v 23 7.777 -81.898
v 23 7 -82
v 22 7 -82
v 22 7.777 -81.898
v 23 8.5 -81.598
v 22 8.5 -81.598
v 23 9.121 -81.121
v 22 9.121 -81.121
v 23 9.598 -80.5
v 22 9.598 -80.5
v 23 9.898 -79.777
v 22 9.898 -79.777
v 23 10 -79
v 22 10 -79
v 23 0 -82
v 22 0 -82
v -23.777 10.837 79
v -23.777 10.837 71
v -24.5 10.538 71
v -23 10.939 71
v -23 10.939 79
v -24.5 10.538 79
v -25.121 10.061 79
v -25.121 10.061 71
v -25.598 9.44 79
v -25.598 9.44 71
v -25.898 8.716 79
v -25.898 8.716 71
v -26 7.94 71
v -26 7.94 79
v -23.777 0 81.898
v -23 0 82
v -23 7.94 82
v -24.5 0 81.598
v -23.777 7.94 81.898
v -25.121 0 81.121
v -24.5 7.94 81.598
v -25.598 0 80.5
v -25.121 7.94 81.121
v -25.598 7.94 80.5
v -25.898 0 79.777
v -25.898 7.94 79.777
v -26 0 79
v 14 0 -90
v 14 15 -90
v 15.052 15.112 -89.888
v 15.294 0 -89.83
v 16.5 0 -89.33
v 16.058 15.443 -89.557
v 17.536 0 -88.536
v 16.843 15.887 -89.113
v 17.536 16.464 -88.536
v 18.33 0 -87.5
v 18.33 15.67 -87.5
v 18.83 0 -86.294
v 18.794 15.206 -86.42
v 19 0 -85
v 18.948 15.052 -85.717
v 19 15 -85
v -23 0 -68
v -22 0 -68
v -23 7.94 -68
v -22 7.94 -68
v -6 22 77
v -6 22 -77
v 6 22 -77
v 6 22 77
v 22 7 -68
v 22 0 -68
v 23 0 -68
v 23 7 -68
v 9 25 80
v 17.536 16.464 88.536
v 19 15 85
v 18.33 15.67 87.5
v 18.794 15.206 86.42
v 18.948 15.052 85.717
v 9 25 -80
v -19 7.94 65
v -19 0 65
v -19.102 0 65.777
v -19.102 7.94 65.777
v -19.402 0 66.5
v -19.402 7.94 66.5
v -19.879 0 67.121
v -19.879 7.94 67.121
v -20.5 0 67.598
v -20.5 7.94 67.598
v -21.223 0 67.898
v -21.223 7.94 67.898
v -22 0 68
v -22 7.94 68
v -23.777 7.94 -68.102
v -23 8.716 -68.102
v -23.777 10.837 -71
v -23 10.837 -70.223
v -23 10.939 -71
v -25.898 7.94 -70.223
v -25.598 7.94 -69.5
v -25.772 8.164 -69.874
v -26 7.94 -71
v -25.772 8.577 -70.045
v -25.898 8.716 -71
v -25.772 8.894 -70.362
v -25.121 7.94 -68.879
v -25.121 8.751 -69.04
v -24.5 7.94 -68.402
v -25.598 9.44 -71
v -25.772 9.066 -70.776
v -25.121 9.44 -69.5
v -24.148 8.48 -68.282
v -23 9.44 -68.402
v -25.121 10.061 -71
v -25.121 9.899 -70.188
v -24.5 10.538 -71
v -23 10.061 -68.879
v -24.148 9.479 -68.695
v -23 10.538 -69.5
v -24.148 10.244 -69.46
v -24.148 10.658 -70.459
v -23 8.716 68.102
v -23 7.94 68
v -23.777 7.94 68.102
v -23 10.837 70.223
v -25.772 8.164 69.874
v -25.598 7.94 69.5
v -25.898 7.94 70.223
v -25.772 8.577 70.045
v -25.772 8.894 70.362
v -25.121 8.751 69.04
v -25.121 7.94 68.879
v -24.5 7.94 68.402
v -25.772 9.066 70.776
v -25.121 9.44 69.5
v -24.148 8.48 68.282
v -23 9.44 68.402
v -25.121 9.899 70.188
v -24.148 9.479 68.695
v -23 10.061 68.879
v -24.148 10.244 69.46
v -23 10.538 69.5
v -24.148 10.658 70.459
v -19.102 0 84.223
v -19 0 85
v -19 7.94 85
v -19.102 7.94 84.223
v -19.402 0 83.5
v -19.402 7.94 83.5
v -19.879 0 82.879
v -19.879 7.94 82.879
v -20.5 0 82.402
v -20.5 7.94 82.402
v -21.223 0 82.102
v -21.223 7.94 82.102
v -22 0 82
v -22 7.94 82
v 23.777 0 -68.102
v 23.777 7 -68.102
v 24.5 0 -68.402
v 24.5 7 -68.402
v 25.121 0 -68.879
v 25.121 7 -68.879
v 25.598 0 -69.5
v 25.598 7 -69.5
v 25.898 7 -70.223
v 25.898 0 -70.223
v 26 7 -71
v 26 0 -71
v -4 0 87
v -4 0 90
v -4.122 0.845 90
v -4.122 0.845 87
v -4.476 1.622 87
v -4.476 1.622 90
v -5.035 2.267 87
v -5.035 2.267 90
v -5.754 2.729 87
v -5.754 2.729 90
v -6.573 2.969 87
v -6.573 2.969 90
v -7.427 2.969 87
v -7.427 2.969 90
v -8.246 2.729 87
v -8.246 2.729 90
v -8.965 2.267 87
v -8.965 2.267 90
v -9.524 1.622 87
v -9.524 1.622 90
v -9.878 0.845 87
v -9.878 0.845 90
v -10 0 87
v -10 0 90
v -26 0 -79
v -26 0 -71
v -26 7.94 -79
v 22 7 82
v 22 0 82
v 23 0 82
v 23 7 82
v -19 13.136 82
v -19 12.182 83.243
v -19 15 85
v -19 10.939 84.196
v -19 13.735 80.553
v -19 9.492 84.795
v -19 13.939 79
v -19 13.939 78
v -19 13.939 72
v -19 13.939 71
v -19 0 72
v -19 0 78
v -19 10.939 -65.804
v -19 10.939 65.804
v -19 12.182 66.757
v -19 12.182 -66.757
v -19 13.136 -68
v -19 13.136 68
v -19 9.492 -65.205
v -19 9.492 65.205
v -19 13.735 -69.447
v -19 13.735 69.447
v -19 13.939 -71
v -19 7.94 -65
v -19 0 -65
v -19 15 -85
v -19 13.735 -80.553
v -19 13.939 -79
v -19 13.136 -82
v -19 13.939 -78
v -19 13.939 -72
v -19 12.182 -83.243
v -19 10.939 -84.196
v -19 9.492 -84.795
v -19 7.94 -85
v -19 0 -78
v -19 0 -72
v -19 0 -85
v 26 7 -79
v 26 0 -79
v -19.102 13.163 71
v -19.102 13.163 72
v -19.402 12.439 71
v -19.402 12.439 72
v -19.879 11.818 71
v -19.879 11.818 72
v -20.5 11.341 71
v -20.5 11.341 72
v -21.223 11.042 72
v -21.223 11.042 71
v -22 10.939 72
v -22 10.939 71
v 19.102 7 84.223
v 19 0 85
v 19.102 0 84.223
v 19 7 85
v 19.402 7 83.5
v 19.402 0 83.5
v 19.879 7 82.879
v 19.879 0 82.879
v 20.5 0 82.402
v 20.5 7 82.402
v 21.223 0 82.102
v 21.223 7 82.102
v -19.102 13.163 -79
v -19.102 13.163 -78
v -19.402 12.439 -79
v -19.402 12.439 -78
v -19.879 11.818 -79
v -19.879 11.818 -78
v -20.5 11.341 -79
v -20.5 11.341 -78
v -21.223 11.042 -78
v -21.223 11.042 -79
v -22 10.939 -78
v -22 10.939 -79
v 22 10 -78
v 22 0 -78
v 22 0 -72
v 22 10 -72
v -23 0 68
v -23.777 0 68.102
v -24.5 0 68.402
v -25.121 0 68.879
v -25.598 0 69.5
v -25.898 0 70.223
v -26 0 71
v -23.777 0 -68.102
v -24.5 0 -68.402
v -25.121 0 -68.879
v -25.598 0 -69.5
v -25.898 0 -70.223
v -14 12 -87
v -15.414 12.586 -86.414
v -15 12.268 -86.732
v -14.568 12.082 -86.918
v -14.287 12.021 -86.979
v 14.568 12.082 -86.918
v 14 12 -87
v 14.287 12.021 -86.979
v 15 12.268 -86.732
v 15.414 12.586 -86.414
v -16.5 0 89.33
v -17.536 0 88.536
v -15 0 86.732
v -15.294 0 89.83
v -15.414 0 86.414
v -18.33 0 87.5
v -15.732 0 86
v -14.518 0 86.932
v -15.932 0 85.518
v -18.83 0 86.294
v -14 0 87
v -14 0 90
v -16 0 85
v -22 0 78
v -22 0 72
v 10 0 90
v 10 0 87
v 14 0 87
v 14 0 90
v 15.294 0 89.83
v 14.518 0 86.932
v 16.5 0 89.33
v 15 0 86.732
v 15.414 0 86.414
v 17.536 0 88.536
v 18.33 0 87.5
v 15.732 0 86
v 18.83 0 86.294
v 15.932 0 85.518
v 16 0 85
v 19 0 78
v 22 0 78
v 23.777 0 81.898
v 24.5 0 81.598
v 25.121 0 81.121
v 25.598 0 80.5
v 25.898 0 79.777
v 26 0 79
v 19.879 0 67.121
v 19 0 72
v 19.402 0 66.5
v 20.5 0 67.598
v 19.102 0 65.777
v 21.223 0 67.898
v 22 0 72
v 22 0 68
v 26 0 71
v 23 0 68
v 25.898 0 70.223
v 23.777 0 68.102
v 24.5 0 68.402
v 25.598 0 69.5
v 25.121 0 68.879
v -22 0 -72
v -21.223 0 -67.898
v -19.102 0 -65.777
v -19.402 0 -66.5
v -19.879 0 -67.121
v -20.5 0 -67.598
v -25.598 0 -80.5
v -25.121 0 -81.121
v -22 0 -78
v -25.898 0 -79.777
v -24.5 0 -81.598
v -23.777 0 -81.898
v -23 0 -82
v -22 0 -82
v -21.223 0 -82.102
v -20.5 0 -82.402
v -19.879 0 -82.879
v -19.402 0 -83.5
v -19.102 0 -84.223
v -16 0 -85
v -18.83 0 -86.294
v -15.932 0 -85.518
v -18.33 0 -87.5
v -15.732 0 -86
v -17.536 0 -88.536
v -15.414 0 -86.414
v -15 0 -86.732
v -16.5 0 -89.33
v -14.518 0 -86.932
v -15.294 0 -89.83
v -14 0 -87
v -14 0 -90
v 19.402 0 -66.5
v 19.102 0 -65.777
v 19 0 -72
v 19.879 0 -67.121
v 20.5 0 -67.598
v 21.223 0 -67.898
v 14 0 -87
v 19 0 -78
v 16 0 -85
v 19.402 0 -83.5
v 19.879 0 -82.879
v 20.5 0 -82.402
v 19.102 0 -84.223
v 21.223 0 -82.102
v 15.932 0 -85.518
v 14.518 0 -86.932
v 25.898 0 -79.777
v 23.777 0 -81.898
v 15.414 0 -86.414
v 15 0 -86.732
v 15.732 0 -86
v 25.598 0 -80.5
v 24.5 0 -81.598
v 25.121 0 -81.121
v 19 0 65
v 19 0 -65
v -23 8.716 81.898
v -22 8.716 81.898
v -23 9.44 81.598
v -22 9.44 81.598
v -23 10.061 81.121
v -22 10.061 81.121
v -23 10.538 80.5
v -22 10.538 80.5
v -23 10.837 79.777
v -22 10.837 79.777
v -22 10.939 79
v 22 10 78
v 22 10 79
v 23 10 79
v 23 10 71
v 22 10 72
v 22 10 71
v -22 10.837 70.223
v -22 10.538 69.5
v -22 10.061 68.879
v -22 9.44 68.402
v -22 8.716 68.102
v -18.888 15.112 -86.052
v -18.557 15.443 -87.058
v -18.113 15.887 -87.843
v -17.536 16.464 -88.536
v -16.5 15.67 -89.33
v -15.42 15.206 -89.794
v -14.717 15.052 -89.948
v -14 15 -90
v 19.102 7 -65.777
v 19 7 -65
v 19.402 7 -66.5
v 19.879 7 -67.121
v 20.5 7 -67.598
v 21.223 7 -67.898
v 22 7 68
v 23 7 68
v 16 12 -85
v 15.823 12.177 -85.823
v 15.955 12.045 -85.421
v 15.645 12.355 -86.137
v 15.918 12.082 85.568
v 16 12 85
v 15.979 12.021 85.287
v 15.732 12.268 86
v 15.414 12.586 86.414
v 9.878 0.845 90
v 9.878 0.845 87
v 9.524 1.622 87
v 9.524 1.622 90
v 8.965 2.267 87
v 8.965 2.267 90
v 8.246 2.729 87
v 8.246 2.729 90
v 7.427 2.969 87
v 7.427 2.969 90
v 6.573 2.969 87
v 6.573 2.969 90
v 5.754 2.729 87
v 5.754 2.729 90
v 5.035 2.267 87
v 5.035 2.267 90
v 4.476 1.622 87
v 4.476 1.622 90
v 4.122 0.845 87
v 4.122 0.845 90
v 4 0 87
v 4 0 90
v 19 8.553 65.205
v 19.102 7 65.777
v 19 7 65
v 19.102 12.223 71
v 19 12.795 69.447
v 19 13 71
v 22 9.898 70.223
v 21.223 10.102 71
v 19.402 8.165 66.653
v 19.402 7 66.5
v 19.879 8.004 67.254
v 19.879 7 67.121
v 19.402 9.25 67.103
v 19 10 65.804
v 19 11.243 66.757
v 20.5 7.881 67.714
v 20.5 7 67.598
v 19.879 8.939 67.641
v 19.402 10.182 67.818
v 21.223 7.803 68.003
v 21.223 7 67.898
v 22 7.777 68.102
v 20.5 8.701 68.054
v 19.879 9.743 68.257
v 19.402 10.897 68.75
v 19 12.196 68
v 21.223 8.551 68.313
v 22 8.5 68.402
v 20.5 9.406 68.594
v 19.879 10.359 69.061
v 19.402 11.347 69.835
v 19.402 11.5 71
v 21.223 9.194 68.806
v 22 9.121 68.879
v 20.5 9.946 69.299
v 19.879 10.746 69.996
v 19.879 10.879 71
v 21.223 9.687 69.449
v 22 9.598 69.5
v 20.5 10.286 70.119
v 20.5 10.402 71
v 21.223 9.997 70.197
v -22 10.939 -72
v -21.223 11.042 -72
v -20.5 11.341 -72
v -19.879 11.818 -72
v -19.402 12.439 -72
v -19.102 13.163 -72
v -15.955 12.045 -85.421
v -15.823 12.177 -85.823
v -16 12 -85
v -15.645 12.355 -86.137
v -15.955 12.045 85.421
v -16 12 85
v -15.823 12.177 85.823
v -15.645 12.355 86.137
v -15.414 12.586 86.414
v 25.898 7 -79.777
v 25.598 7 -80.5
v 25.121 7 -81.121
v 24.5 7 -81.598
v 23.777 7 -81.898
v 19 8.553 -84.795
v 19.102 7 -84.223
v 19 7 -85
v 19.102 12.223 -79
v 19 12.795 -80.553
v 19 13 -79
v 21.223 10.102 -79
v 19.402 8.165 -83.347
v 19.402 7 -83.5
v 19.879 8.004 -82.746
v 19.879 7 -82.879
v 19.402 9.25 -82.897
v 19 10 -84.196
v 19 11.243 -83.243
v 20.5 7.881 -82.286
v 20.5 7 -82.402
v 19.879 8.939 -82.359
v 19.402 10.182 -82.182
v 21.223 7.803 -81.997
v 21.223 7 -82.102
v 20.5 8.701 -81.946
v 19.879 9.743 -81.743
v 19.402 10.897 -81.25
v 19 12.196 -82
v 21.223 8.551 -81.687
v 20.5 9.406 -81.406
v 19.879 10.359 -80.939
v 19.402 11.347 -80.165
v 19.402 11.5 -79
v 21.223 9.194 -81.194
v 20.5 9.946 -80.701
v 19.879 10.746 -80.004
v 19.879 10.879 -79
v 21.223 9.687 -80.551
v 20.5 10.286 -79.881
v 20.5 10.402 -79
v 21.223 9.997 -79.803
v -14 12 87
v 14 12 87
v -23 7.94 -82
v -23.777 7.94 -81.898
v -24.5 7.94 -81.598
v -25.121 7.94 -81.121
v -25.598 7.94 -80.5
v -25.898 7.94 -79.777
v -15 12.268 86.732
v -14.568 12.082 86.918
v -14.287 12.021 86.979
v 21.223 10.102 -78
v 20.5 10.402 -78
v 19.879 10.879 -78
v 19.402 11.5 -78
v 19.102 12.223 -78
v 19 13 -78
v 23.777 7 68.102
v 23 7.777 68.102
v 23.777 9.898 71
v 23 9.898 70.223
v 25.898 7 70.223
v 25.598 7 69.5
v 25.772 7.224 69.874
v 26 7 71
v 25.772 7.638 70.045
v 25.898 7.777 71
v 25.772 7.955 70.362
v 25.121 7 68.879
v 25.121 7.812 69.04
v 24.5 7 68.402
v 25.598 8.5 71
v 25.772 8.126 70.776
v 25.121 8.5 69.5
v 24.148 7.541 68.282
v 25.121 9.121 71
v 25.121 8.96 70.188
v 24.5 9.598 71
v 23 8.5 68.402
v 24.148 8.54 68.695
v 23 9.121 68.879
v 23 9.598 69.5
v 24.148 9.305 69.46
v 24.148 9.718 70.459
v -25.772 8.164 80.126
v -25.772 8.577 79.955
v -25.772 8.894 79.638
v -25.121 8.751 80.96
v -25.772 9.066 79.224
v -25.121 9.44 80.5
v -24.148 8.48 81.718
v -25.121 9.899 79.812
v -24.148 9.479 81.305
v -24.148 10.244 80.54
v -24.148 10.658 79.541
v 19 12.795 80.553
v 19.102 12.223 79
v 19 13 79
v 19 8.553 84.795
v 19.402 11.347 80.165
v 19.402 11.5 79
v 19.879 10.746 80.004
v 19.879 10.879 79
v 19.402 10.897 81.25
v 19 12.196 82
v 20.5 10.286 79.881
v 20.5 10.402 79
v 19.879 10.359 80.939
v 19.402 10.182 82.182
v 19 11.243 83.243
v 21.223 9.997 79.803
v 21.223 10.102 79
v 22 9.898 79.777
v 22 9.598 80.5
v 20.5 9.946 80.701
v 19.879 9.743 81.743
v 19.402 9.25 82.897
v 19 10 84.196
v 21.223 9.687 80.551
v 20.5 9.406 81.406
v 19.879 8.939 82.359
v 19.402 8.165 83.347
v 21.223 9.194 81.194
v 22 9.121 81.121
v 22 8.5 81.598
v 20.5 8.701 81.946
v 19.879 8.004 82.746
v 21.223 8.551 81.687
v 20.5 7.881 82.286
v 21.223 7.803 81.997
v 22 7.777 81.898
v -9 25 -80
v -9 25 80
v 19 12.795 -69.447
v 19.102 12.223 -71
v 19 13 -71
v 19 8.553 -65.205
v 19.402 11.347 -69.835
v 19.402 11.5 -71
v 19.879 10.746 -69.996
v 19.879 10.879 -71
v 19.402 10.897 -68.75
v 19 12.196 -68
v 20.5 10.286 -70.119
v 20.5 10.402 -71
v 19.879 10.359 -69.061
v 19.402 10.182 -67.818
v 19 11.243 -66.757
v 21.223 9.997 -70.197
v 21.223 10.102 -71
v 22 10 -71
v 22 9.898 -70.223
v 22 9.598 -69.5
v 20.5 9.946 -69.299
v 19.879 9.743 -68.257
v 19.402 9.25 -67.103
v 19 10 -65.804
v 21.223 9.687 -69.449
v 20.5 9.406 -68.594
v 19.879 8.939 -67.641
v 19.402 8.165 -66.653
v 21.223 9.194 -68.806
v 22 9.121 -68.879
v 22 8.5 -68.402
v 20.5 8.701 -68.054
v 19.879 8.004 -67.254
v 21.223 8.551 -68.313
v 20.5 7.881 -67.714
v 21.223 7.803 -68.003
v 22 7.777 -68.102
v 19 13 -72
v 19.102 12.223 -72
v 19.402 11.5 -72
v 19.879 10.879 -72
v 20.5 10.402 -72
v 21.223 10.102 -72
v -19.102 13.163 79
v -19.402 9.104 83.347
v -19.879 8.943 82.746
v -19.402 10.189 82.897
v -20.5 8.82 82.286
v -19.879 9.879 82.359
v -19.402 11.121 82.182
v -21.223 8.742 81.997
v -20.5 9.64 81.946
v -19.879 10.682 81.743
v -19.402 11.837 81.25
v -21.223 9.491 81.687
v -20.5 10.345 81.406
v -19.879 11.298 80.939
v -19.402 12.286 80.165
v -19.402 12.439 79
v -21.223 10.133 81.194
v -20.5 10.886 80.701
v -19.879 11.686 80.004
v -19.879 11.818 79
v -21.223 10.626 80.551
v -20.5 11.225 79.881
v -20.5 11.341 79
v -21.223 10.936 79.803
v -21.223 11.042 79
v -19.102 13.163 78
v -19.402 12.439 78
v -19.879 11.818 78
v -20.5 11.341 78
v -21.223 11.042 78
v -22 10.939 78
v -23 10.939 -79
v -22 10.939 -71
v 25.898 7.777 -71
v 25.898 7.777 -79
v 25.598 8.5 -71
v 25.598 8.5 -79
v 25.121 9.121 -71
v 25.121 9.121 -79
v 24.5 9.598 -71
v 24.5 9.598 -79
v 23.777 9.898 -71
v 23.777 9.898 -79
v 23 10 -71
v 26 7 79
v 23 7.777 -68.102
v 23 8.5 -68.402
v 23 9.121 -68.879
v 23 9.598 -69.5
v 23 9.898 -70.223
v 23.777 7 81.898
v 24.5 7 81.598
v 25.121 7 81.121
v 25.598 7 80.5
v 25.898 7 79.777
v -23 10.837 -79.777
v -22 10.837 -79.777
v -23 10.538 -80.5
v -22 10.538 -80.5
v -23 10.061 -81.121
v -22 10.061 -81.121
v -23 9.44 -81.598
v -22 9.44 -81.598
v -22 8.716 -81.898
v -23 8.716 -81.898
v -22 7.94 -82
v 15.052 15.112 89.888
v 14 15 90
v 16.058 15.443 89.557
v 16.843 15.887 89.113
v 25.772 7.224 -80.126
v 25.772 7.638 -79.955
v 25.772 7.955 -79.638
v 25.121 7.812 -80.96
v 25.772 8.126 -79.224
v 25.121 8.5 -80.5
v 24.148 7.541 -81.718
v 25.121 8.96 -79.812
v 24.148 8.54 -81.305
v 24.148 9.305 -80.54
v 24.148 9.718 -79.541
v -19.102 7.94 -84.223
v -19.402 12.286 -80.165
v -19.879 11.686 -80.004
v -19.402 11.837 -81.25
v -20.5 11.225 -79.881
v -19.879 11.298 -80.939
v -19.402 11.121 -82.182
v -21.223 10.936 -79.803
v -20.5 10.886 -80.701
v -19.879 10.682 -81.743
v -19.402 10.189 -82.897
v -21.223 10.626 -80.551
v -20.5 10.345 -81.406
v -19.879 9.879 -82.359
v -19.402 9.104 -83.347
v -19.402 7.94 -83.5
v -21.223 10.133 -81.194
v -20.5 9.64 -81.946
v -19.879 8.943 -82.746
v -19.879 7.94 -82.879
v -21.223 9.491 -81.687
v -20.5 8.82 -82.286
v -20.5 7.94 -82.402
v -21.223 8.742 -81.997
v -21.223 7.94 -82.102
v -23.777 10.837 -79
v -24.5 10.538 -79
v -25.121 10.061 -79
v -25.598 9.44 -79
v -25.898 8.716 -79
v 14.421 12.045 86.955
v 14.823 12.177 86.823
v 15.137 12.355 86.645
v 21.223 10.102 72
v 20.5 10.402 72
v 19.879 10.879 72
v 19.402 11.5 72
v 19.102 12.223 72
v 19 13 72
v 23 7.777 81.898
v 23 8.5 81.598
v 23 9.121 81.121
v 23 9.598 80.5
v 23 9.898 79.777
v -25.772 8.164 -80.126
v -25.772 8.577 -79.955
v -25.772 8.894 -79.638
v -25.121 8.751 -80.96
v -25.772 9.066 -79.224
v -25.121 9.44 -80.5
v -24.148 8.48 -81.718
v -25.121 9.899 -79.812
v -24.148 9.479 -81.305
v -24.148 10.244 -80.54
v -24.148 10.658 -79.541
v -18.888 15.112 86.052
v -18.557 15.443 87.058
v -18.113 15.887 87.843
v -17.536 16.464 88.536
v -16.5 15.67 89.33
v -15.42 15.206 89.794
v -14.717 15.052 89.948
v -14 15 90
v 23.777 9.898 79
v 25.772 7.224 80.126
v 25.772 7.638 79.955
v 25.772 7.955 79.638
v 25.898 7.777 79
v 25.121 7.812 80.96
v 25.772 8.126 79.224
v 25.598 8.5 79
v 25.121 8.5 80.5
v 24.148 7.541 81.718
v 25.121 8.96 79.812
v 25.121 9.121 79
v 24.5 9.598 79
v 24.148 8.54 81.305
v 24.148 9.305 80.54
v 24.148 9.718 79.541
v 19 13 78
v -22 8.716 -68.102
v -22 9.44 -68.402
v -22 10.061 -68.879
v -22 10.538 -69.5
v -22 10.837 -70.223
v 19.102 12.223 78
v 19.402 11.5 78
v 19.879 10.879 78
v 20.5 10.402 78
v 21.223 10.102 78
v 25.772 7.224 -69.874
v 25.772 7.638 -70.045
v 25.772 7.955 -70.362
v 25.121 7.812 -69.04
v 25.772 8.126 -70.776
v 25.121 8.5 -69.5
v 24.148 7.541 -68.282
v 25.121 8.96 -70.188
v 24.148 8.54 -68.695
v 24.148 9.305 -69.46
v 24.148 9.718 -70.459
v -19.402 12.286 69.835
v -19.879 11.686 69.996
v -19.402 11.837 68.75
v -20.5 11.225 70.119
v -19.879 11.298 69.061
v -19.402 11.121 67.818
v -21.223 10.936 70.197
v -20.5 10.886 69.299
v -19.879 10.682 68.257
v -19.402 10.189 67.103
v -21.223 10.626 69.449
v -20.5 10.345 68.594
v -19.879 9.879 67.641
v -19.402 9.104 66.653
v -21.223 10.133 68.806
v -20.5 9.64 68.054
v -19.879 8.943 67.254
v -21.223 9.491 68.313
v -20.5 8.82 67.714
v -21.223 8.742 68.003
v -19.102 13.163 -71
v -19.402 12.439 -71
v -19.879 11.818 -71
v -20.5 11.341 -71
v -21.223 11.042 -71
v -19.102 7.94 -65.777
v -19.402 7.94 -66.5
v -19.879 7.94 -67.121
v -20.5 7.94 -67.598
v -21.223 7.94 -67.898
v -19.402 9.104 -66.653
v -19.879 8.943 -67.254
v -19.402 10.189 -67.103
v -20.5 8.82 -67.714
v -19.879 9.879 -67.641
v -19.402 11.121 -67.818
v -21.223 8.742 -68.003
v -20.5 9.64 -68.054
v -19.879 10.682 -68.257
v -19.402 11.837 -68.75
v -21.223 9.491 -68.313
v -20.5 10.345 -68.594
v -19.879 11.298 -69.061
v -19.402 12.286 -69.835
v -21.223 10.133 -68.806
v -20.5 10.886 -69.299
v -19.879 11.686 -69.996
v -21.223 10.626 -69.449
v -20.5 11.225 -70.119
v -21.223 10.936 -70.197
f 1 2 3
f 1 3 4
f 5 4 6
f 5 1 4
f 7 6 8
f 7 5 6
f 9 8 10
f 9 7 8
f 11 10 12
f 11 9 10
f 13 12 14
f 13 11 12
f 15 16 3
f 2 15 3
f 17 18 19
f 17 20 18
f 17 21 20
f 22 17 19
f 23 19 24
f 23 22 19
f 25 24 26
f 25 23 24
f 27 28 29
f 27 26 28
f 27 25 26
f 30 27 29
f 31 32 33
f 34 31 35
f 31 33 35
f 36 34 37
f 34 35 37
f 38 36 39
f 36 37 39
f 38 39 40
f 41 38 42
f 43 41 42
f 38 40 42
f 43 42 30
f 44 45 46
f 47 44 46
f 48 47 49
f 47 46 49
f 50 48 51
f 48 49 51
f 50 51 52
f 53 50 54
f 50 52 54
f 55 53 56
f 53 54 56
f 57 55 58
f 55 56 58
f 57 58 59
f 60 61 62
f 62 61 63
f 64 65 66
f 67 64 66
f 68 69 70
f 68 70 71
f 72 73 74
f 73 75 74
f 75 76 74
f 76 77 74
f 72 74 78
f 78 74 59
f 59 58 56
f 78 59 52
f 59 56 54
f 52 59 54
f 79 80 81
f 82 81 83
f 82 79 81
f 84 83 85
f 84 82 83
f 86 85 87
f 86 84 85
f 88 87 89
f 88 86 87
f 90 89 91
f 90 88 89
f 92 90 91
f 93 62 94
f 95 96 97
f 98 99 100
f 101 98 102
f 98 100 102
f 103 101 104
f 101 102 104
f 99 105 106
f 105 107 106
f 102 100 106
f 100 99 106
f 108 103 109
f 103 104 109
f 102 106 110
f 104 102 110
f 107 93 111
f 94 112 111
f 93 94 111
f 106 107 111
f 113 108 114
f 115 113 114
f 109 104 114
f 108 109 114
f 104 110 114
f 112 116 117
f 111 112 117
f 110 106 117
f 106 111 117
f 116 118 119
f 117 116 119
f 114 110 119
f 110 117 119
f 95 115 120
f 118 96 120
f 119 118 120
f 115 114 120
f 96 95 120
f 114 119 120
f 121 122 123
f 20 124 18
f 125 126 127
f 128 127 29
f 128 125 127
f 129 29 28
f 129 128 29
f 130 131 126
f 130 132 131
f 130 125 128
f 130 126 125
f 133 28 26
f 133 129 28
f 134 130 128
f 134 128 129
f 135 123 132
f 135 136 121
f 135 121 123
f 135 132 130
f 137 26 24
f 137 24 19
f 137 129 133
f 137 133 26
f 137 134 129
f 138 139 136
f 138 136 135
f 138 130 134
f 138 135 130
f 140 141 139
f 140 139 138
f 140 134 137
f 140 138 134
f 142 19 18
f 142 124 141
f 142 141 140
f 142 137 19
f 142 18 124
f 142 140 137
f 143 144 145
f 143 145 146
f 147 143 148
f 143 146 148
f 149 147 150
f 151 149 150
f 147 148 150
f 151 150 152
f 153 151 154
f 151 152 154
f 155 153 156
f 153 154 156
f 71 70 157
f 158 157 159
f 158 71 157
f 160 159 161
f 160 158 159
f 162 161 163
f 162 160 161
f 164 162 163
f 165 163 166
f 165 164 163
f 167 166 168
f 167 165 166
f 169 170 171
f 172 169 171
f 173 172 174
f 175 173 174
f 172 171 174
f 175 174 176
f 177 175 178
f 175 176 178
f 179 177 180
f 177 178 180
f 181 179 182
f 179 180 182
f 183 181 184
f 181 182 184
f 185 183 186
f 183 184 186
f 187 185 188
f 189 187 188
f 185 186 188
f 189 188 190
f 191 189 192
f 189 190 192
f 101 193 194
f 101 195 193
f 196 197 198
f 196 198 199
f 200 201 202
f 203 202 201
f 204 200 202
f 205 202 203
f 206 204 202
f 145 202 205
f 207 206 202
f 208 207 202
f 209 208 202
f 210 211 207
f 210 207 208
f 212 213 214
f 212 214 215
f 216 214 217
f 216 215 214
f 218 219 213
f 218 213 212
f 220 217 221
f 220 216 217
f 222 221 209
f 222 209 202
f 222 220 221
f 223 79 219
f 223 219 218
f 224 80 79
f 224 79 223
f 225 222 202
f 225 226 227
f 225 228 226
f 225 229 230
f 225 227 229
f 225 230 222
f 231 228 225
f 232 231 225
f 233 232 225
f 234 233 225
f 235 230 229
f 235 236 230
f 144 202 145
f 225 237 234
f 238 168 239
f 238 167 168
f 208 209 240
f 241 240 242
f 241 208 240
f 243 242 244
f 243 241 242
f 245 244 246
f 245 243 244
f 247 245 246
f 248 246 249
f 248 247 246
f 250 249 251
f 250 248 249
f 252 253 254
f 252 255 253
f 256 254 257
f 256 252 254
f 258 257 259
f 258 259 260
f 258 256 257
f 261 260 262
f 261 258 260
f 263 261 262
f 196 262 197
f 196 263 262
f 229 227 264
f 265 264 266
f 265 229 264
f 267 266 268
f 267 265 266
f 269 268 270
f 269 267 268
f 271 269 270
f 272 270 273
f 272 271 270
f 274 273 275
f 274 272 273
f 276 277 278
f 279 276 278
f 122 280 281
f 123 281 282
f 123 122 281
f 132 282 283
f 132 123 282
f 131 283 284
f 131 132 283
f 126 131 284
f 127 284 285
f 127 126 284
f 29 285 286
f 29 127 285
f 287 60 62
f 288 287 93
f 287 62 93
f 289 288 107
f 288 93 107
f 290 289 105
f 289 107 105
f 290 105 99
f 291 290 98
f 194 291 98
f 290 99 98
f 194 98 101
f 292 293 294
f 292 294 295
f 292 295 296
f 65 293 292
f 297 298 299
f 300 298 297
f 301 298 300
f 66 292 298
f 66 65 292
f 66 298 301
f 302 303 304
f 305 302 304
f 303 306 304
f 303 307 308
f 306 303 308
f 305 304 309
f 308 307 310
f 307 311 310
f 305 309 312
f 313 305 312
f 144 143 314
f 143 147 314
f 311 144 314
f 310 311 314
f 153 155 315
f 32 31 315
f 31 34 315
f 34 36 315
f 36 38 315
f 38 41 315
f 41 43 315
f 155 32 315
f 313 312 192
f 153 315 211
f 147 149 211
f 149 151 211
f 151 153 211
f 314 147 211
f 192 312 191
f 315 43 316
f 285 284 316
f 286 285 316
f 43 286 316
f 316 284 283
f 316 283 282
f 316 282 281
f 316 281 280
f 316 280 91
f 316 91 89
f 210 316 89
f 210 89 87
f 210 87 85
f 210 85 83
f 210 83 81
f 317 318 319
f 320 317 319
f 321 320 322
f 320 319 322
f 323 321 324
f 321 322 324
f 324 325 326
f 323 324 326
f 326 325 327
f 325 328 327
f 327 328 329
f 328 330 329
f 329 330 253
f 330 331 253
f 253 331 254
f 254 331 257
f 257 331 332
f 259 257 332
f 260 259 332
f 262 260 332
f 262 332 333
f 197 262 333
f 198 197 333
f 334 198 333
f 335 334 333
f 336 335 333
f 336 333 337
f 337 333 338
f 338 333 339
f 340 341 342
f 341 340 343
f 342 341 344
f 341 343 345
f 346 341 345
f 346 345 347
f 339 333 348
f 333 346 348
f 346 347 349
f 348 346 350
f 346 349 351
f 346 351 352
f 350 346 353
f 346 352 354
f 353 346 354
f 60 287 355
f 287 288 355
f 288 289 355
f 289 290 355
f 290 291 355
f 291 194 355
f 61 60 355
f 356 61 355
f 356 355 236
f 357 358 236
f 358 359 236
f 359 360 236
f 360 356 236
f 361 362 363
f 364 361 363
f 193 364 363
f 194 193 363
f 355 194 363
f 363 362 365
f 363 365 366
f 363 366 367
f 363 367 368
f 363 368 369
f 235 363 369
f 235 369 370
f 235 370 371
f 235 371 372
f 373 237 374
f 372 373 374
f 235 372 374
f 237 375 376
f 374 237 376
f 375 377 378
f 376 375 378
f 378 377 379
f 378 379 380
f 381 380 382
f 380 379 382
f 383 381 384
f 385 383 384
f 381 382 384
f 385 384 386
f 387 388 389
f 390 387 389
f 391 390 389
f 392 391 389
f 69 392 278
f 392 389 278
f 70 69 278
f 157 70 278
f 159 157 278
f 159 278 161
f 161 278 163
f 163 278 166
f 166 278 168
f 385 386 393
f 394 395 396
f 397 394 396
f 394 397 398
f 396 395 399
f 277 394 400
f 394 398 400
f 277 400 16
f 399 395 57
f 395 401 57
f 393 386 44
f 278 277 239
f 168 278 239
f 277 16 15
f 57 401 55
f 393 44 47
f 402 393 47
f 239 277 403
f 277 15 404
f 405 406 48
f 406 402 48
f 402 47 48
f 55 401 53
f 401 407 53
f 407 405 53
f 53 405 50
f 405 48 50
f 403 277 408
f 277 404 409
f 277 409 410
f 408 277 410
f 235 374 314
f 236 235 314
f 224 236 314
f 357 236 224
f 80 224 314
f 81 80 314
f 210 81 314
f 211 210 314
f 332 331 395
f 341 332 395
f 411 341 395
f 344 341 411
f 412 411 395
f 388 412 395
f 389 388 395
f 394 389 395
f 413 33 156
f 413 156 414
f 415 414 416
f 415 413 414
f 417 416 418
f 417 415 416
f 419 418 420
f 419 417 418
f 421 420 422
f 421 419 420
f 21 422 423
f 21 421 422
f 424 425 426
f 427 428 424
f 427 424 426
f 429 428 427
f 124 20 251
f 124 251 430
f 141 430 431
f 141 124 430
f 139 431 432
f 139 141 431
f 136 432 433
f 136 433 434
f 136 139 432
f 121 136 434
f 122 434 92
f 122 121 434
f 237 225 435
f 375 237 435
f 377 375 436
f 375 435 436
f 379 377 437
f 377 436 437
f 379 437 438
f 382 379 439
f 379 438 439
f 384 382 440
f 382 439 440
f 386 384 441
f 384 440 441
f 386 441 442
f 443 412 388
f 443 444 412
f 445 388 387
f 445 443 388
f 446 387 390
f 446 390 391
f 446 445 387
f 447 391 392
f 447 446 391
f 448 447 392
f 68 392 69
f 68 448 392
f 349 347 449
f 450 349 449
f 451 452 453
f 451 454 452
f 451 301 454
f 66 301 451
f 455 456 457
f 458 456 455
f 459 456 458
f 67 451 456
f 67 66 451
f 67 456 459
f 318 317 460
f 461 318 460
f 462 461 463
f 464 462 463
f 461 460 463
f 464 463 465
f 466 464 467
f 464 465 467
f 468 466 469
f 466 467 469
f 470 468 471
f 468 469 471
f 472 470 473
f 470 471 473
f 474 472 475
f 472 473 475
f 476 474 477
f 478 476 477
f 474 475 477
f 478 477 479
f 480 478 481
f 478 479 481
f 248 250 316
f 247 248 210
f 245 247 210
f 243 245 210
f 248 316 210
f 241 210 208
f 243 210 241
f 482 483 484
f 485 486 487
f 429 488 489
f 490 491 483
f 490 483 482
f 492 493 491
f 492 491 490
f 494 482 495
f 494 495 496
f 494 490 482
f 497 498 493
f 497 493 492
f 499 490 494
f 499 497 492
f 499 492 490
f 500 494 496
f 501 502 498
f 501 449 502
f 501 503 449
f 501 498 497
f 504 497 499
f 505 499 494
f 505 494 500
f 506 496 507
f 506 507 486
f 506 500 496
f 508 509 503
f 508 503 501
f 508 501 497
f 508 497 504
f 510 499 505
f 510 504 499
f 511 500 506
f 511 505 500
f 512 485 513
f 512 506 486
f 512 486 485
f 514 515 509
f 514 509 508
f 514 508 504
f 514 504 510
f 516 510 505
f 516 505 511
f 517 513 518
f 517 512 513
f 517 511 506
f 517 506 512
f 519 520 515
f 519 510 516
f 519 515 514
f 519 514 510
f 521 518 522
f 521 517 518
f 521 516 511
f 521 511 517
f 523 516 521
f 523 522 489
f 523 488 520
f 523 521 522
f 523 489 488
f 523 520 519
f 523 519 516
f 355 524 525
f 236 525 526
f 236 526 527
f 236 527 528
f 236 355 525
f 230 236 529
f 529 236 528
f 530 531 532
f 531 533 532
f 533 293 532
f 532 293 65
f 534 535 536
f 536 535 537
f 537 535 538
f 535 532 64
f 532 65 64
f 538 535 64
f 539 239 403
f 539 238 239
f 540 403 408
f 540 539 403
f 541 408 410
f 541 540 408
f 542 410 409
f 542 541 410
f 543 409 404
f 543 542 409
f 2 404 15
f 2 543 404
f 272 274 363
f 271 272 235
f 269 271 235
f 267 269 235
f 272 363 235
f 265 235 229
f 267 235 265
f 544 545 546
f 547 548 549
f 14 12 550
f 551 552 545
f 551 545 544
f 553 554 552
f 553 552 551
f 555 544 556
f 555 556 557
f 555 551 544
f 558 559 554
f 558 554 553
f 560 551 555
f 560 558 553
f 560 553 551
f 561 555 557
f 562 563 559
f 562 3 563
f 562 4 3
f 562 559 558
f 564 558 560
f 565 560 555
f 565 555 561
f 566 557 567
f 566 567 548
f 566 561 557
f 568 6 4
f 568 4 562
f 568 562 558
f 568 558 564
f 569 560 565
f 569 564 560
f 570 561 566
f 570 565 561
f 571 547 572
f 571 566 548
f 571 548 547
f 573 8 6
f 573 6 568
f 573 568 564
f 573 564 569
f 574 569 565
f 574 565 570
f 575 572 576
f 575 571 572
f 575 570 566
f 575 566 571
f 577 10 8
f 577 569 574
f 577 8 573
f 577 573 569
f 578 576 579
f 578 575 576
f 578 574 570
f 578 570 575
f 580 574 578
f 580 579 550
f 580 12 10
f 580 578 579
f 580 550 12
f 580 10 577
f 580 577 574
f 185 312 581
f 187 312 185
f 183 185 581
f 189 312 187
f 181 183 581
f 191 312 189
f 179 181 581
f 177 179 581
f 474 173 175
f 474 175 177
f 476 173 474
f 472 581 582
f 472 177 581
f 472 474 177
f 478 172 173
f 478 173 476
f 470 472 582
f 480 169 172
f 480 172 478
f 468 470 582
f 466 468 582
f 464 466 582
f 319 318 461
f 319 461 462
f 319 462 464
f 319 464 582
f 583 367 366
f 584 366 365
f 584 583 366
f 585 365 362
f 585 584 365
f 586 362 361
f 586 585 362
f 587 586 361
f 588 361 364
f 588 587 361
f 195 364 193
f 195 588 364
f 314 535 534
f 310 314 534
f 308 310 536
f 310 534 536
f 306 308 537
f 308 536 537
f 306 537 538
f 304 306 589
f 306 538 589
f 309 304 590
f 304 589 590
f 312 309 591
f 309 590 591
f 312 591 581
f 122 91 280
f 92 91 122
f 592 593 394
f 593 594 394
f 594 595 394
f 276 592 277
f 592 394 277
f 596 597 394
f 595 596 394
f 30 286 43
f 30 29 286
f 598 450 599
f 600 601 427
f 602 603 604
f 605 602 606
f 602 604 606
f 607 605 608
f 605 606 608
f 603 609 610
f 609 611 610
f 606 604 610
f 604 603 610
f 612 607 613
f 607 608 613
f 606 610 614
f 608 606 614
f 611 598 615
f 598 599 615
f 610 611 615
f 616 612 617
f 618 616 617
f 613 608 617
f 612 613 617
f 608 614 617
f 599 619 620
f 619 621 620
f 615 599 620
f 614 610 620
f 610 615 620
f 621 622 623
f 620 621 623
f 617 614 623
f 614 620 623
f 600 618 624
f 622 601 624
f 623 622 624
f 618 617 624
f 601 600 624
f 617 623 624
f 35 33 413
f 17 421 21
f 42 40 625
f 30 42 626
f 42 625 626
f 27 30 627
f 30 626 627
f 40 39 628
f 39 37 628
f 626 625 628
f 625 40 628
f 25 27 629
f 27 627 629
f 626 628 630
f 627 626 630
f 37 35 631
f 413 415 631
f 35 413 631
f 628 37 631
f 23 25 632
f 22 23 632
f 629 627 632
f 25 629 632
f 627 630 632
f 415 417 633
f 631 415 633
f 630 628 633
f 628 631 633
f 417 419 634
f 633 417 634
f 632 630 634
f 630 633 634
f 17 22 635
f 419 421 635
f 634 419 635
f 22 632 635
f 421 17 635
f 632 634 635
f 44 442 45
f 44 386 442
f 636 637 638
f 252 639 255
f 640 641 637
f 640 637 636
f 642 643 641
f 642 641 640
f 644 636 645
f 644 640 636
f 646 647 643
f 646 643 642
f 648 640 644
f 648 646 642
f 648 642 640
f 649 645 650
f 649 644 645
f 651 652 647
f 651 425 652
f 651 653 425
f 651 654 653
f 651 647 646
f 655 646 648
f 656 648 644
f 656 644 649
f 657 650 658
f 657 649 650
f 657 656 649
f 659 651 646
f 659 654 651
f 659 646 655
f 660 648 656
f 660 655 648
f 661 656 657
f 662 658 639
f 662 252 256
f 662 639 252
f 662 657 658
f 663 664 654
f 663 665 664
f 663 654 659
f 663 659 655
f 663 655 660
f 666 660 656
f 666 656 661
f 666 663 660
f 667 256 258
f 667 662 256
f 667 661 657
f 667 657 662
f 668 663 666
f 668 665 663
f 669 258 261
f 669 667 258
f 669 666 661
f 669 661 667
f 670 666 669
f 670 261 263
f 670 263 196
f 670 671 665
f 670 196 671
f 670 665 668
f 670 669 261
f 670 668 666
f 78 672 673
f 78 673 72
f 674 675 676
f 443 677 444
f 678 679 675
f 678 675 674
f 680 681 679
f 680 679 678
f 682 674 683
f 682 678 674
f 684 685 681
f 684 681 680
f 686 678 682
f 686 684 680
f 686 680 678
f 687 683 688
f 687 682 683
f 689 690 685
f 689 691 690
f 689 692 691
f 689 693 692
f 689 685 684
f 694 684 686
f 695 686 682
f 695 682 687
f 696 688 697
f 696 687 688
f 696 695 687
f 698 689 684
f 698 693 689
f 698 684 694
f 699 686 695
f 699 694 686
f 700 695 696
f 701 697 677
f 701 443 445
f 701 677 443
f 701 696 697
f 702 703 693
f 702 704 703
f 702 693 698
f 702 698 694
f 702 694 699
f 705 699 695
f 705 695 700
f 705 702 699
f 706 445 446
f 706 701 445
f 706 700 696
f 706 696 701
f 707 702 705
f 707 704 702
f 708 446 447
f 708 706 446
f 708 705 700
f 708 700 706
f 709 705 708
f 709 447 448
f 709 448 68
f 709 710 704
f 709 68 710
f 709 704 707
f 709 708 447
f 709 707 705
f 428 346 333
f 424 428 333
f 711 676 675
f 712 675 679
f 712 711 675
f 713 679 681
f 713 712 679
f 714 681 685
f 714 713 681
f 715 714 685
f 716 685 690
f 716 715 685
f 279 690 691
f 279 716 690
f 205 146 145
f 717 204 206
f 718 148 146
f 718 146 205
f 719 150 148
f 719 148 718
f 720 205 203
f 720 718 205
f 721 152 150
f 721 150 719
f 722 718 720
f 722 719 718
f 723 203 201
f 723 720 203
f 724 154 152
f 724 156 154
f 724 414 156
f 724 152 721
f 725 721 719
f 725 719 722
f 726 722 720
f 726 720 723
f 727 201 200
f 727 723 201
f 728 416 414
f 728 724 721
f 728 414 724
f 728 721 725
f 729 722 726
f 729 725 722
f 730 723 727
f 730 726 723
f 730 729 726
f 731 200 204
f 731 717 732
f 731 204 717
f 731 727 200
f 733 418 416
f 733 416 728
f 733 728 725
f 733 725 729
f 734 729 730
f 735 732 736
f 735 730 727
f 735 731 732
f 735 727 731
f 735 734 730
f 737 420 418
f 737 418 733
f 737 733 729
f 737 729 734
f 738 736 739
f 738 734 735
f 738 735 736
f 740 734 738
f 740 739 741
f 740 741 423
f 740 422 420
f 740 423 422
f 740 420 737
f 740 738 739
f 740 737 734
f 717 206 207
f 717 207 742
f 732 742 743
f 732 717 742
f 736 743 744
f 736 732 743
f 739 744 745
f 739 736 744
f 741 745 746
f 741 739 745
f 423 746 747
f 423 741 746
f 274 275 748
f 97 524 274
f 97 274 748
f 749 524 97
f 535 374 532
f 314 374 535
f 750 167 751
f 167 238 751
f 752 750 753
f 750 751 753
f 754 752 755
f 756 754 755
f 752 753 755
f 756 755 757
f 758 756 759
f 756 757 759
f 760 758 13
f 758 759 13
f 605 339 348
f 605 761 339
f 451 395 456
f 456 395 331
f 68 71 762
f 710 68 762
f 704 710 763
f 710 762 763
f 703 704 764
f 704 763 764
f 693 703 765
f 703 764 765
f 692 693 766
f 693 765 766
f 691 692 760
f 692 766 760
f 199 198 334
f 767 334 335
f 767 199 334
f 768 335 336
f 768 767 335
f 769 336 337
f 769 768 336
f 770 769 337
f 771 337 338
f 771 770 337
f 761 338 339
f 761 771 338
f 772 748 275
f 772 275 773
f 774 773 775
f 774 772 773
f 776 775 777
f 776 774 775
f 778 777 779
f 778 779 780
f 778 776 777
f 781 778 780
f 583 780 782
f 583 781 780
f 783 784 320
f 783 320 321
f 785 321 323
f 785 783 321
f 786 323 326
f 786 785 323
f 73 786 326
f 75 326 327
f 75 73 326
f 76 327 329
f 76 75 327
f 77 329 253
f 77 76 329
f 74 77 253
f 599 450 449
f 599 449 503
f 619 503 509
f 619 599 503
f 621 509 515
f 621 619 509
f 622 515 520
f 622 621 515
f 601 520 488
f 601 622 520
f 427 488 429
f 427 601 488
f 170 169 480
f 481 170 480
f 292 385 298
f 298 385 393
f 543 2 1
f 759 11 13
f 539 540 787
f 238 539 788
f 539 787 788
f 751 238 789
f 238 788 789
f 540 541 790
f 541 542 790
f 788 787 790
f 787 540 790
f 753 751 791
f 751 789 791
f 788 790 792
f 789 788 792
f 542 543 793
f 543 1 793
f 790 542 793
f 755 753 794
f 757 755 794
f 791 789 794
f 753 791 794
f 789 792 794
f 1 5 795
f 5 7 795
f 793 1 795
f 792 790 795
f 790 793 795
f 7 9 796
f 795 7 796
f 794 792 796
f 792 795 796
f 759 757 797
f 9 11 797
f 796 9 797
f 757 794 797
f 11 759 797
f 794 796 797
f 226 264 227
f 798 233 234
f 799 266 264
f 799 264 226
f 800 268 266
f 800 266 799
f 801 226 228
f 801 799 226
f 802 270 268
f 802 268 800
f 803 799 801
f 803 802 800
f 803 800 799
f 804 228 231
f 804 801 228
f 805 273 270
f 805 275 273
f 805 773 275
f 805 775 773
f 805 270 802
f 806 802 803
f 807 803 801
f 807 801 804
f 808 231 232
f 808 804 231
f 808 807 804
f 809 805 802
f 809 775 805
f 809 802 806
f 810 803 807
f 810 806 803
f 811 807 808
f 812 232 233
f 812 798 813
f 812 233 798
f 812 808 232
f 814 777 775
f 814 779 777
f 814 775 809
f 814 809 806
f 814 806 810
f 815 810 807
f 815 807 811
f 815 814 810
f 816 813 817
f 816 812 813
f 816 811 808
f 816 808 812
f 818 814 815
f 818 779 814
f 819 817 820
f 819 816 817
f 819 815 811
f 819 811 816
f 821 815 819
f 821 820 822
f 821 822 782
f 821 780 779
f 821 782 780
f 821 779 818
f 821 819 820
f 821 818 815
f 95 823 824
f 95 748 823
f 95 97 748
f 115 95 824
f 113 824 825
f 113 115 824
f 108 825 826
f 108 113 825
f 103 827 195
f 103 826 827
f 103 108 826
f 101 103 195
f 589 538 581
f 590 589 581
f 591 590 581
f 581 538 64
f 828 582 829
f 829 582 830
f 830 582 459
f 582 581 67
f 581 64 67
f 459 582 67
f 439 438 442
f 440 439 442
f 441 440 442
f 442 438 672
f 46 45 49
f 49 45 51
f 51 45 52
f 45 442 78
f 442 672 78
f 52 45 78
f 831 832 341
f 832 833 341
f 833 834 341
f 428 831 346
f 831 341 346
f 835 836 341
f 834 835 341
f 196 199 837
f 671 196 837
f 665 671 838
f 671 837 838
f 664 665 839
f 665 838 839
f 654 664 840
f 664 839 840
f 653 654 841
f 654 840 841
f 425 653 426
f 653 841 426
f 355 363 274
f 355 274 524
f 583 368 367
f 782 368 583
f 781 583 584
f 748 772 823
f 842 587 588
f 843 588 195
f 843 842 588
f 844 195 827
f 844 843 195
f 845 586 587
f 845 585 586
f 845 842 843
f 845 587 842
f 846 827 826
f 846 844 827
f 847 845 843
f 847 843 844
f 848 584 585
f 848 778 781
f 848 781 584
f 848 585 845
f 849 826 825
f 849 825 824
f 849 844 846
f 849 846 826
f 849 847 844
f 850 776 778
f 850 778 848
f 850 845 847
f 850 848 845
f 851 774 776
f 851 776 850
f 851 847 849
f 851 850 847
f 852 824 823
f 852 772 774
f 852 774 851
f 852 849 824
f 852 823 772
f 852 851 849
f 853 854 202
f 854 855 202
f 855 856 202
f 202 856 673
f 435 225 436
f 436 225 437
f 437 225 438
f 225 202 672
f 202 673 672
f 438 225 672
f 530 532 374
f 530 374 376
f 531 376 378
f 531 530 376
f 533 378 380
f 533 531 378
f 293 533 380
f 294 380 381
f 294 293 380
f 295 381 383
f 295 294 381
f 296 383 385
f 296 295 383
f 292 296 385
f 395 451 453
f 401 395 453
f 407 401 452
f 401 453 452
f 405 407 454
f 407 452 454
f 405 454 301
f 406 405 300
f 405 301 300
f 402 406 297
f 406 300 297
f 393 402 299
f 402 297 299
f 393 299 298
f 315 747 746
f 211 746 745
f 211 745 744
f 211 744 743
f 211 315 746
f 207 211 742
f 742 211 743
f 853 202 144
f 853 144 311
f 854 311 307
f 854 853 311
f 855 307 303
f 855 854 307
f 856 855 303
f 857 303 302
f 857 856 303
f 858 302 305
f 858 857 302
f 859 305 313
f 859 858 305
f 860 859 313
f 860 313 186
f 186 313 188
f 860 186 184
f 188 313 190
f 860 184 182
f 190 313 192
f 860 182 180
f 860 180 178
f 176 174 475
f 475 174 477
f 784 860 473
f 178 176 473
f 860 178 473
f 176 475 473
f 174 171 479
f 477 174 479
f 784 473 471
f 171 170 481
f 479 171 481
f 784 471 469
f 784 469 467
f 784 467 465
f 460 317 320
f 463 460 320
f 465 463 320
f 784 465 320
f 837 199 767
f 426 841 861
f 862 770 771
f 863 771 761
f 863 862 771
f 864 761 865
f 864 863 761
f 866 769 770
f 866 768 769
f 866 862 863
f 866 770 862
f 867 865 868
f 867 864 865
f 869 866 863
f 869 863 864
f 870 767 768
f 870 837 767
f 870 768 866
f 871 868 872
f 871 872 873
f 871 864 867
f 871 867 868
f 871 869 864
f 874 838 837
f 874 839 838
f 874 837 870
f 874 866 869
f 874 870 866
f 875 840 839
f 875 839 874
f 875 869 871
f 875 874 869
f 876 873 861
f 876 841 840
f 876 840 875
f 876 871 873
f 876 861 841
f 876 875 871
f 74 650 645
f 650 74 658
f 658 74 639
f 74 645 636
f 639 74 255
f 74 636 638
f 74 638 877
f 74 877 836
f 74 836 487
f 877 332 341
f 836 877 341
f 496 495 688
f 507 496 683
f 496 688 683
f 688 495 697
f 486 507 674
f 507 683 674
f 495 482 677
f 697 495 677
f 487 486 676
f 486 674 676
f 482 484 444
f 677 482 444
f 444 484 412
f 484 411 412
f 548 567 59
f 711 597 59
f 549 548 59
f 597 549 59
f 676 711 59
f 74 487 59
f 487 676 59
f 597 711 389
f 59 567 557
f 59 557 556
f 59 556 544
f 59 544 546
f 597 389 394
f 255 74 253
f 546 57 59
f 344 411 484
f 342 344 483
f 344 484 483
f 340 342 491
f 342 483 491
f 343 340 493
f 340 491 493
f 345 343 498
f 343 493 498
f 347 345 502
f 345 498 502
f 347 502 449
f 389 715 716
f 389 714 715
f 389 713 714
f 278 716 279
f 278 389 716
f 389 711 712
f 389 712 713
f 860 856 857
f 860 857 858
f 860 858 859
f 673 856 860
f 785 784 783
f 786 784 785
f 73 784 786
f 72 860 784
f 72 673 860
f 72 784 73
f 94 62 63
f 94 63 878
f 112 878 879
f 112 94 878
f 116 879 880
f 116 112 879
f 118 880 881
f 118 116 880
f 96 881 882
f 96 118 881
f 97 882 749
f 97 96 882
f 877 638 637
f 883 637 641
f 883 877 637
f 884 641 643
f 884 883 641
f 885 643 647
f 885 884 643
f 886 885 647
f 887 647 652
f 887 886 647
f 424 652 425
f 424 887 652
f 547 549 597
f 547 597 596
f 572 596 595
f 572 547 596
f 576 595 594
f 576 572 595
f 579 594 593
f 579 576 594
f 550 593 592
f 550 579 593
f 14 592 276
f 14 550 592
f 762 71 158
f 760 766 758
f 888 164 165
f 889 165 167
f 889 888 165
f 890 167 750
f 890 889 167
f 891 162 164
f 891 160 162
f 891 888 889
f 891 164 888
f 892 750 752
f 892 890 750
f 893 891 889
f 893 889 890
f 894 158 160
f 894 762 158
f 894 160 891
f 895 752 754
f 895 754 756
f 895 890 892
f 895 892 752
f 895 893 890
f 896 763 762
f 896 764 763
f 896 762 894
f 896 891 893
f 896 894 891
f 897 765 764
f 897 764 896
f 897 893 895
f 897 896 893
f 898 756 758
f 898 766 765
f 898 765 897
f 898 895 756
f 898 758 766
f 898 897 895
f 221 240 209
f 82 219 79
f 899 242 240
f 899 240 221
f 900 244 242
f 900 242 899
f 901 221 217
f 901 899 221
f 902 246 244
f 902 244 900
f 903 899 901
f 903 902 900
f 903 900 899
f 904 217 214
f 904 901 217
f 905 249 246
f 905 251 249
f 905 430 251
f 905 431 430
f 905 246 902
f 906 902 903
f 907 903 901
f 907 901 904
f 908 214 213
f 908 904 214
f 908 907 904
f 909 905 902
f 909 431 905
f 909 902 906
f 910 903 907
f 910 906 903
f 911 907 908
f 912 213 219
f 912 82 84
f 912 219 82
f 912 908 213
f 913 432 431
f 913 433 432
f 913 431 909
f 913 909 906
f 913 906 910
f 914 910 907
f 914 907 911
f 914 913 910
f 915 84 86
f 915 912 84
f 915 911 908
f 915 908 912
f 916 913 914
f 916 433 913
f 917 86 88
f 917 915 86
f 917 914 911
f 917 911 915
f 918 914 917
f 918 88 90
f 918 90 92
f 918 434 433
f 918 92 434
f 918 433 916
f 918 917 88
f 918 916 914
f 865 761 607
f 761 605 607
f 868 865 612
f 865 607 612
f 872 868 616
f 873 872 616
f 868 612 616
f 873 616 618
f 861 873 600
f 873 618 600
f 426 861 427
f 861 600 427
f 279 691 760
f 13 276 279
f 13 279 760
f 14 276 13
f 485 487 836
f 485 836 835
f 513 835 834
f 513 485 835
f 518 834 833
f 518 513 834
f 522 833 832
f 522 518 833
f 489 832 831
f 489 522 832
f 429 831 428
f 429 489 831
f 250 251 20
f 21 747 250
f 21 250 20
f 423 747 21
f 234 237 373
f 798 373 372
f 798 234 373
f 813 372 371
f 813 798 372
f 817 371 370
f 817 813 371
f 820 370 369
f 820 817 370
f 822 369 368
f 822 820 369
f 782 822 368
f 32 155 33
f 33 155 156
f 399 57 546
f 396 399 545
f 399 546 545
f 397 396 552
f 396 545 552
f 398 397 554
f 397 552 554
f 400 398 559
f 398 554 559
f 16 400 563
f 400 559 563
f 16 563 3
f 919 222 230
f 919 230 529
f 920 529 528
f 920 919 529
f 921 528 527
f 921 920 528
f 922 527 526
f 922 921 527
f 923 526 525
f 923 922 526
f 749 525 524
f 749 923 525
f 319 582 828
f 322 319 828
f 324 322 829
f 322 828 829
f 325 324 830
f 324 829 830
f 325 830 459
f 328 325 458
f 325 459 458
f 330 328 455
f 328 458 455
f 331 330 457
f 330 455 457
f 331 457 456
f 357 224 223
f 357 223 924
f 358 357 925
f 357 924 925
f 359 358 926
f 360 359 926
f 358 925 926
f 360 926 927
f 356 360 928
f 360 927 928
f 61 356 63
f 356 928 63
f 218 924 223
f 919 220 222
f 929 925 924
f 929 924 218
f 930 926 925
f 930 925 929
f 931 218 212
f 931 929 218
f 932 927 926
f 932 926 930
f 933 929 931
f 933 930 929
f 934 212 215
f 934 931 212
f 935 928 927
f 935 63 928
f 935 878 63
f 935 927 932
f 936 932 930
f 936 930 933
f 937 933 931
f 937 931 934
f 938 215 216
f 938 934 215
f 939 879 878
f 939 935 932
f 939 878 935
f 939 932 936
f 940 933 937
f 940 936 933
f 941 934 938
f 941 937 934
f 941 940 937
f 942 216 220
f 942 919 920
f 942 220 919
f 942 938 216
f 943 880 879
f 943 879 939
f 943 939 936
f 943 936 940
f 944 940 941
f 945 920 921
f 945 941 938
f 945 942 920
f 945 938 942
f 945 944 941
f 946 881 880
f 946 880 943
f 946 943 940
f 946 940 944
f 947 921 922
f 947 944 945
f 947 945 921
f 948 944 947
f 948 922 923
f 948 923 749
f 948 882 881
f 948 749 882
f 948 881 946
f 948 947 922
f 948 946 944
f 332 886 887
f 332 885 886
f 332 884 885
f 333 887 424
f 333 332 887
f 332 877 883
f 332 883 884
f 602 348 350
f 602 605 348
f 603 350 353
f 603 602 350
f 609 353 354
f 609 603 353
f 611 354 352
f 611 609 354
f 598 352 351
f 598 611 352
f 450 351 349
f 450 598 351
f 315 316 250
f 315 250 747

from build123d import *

# Parameters (mm, degrees)
SKETCH1_W           = 38
SKETCH1_H           = 180
BOSS_EXTRUDE1_DEPTH = 25
SKETCH2_W           = 32
SKETCH2_H           = 174
CUT_EXTRUDE1_DEPTH  = 22
CHAMFER1_SIZE       = 10
FILLET1_R           = 5
FILLET2_R           = 2
SKETCH3_W           = 14
SKETCH3_H           = 10
BOSS_EXTRUDE2_DEPTH = 7
SKETCH4_W           = 14
SKETCH4_H           = 10.939467079
BOSS_EXTRUDE3_DEPTH = 7
FILLET3_R           = 3
SKETCH5_W           = 3
SKETCH5_H           = 6
CUT_EXTRUDE2_DEPTH  = 97.958754117
SKETCH6_R           = 3
CUT_EXTRUDE3_DEPTH  = 10


with BuildPart() as part:
    # Sketch1 → Boss-Extrude1 (new body)
    with BuildSketch(Plane(origin=(0, 0, 0), x_dir=(1, 0, 0), z_dir=(0, 1, 0))):
        Rectangle(SKETCH1_W, SKETCH1_H)
    extrude(amount=BOSS_EXTRUDE1_DEPTH)

    # Sketch2 → Cut-Extrude1 (cut)
    with BuildSketch(Plane.XZ):
        Rectangle(SKETCH2_W, SKETCH2_H)
    extrude(amount=-CUT_EXTRUDE1_DEPTH, mode=Mode.SUBTRACT)

    # Chamfer1
    chamfer1_edges = [part.edges().sort_by_distance(p)[0] for p in [
        (-19, 25, 0),
        (16, 22, 0),
        (0, 25, 90),
        (0, 22, -87),
        (-16, 22, 0),
        (0, 22, 87),
        (19, 25, 0),
        (0, 25, -90),
    ]]
    chamfer(chamfer1_edges, length=CHAMFER1_SIZE)

    # Fillet1
    fillet1_edges = [part.edges().sort_by_distance(p)[0] for p in [
        (19, 7.5, 90),
        (-19, 7.5, 90),
        (-19, 7.5, -90),
        (19, 7.5, -90),
    ]]
    fillet(fillet1_edges, radius=FILLET1_R)

    # Fillet2
    fillet2_edges = [part.edges().sort_by_distance(p)[0] for p in [
        (16, 6, -87),
        (-16, 6, -87),
        (-16, 6, 87),
        (16, 6, 87),
    ]]
    fillet(fillet2_edges, radius=FILLET2_R)

    # Sketch3 → Boss-Extrude2 (add)
    with BuildSketch(Plane(origin=(19, 0, 0), x_dir=(0, 0, -1), z_dir=(1, 0, 0))):
        with Locations((-75, 5)):
            Rectangle(SKETCH3_W, SKETCH3_H)
        with Locations((75, 5)):
            Rectangle(SKETCH3_W, SKETCH3_H)
    extrude(amount=BOSS_EXTRUDE2_DEPTH)

    # Sketch4 → Boss-Extrude3 (add)
    with BuildSketch(Plane.ZY.offset(19)):
        with Locations((-75, 5.469733539)):
            Rectangle(SKETCH4_W, SKETCH4_H)
        with Locations((75, 5.469733539)):
            Rectangle(SKETCH4_W, SKETCH4_H)
    extrude(amount=BOSS_EXTRUDE3_DEPTH)

    # Fillet3
    fillet3_edges = [part.edges().sort_by_distance(p)[0] for p in [
        (19, 5, 82),
        (22.5, 10, 82),
        (19, 5, 68),
        (19, 10, 75),
        (22.5, 10, 68),
        (26, 5, 82),
        (26, 5, 68),
        (26, 10, 75),
        (19, 5, -68),
        (22.5, 10, -68),
        (19, 5, -82),
        (19, 10, -75),
        (22.5, 10, -82),
        (26, 5, -68),
        (26, 5, -82),
        (26, 10, -75),
        (-19, 5.46973354, -82),
        (-22.5, 10.939467079, -82),
        (-19, 5.46973354, -68),
        (-19, 10.939467079, -75),
        (-22.5, 10.939467079, -68),
        (-26, 5.46973354, -82),
        (-26, 5.46973354, -68),
        (-26, 10.939467079, -75),
        (-19, 5.46973354, 68),
        (-22.5, 10.939467079, 68),
        (-19, 5.46973354, 82),
        (-19, 10.939467079, 75),
        (-22.5, 10.939467079, 82),
        (-26, 5.46973354, 68),
        (-26, 5.46973354, 82),
        (-26, 10.939467079, 75),
    ]]
    fillet(fillet3_edges, radius=FILLET3_R - 0.0001)  # a hair under: the kernel refuses the full size

    # Sketch5 → Cut-Extrude2 (cut, through all)
    with BuildSketch(Plane.XZ):
        with Locations((20.5, 75)):
            Rectangle(SKETCH5_W, SKETCH5_H)
        with Locations((-20.5, -75)):
            Rectangle(SKETCH5_W, SKETCH5_H)
        with Locations((20.5, -75)):
            Rectangle(SKETCH5_W, SKETCH5_H)
        with Locations((-20.5, 75)):
            Rectangle(SKETCH5_W, SKETCH5_H)
    extrude(amount=-CUT_EXTRUDE2_DEPTH, mode=Mode.SUBTRACT)

    # Sketch6 → Cut-Extrude3 (cut)
    with BuildSketch(Plane.XY.offset(90)):
        with Locations((-7, 0)):
            Circle(SKETCH6_R)
        with Locations((7, 0)):
            Circle(SKETCH6_R)
    extrude(amount=-CUT_EXTRUDE3_DEPTH, mode=Mode.SUBTRACT)


solid = part.part
